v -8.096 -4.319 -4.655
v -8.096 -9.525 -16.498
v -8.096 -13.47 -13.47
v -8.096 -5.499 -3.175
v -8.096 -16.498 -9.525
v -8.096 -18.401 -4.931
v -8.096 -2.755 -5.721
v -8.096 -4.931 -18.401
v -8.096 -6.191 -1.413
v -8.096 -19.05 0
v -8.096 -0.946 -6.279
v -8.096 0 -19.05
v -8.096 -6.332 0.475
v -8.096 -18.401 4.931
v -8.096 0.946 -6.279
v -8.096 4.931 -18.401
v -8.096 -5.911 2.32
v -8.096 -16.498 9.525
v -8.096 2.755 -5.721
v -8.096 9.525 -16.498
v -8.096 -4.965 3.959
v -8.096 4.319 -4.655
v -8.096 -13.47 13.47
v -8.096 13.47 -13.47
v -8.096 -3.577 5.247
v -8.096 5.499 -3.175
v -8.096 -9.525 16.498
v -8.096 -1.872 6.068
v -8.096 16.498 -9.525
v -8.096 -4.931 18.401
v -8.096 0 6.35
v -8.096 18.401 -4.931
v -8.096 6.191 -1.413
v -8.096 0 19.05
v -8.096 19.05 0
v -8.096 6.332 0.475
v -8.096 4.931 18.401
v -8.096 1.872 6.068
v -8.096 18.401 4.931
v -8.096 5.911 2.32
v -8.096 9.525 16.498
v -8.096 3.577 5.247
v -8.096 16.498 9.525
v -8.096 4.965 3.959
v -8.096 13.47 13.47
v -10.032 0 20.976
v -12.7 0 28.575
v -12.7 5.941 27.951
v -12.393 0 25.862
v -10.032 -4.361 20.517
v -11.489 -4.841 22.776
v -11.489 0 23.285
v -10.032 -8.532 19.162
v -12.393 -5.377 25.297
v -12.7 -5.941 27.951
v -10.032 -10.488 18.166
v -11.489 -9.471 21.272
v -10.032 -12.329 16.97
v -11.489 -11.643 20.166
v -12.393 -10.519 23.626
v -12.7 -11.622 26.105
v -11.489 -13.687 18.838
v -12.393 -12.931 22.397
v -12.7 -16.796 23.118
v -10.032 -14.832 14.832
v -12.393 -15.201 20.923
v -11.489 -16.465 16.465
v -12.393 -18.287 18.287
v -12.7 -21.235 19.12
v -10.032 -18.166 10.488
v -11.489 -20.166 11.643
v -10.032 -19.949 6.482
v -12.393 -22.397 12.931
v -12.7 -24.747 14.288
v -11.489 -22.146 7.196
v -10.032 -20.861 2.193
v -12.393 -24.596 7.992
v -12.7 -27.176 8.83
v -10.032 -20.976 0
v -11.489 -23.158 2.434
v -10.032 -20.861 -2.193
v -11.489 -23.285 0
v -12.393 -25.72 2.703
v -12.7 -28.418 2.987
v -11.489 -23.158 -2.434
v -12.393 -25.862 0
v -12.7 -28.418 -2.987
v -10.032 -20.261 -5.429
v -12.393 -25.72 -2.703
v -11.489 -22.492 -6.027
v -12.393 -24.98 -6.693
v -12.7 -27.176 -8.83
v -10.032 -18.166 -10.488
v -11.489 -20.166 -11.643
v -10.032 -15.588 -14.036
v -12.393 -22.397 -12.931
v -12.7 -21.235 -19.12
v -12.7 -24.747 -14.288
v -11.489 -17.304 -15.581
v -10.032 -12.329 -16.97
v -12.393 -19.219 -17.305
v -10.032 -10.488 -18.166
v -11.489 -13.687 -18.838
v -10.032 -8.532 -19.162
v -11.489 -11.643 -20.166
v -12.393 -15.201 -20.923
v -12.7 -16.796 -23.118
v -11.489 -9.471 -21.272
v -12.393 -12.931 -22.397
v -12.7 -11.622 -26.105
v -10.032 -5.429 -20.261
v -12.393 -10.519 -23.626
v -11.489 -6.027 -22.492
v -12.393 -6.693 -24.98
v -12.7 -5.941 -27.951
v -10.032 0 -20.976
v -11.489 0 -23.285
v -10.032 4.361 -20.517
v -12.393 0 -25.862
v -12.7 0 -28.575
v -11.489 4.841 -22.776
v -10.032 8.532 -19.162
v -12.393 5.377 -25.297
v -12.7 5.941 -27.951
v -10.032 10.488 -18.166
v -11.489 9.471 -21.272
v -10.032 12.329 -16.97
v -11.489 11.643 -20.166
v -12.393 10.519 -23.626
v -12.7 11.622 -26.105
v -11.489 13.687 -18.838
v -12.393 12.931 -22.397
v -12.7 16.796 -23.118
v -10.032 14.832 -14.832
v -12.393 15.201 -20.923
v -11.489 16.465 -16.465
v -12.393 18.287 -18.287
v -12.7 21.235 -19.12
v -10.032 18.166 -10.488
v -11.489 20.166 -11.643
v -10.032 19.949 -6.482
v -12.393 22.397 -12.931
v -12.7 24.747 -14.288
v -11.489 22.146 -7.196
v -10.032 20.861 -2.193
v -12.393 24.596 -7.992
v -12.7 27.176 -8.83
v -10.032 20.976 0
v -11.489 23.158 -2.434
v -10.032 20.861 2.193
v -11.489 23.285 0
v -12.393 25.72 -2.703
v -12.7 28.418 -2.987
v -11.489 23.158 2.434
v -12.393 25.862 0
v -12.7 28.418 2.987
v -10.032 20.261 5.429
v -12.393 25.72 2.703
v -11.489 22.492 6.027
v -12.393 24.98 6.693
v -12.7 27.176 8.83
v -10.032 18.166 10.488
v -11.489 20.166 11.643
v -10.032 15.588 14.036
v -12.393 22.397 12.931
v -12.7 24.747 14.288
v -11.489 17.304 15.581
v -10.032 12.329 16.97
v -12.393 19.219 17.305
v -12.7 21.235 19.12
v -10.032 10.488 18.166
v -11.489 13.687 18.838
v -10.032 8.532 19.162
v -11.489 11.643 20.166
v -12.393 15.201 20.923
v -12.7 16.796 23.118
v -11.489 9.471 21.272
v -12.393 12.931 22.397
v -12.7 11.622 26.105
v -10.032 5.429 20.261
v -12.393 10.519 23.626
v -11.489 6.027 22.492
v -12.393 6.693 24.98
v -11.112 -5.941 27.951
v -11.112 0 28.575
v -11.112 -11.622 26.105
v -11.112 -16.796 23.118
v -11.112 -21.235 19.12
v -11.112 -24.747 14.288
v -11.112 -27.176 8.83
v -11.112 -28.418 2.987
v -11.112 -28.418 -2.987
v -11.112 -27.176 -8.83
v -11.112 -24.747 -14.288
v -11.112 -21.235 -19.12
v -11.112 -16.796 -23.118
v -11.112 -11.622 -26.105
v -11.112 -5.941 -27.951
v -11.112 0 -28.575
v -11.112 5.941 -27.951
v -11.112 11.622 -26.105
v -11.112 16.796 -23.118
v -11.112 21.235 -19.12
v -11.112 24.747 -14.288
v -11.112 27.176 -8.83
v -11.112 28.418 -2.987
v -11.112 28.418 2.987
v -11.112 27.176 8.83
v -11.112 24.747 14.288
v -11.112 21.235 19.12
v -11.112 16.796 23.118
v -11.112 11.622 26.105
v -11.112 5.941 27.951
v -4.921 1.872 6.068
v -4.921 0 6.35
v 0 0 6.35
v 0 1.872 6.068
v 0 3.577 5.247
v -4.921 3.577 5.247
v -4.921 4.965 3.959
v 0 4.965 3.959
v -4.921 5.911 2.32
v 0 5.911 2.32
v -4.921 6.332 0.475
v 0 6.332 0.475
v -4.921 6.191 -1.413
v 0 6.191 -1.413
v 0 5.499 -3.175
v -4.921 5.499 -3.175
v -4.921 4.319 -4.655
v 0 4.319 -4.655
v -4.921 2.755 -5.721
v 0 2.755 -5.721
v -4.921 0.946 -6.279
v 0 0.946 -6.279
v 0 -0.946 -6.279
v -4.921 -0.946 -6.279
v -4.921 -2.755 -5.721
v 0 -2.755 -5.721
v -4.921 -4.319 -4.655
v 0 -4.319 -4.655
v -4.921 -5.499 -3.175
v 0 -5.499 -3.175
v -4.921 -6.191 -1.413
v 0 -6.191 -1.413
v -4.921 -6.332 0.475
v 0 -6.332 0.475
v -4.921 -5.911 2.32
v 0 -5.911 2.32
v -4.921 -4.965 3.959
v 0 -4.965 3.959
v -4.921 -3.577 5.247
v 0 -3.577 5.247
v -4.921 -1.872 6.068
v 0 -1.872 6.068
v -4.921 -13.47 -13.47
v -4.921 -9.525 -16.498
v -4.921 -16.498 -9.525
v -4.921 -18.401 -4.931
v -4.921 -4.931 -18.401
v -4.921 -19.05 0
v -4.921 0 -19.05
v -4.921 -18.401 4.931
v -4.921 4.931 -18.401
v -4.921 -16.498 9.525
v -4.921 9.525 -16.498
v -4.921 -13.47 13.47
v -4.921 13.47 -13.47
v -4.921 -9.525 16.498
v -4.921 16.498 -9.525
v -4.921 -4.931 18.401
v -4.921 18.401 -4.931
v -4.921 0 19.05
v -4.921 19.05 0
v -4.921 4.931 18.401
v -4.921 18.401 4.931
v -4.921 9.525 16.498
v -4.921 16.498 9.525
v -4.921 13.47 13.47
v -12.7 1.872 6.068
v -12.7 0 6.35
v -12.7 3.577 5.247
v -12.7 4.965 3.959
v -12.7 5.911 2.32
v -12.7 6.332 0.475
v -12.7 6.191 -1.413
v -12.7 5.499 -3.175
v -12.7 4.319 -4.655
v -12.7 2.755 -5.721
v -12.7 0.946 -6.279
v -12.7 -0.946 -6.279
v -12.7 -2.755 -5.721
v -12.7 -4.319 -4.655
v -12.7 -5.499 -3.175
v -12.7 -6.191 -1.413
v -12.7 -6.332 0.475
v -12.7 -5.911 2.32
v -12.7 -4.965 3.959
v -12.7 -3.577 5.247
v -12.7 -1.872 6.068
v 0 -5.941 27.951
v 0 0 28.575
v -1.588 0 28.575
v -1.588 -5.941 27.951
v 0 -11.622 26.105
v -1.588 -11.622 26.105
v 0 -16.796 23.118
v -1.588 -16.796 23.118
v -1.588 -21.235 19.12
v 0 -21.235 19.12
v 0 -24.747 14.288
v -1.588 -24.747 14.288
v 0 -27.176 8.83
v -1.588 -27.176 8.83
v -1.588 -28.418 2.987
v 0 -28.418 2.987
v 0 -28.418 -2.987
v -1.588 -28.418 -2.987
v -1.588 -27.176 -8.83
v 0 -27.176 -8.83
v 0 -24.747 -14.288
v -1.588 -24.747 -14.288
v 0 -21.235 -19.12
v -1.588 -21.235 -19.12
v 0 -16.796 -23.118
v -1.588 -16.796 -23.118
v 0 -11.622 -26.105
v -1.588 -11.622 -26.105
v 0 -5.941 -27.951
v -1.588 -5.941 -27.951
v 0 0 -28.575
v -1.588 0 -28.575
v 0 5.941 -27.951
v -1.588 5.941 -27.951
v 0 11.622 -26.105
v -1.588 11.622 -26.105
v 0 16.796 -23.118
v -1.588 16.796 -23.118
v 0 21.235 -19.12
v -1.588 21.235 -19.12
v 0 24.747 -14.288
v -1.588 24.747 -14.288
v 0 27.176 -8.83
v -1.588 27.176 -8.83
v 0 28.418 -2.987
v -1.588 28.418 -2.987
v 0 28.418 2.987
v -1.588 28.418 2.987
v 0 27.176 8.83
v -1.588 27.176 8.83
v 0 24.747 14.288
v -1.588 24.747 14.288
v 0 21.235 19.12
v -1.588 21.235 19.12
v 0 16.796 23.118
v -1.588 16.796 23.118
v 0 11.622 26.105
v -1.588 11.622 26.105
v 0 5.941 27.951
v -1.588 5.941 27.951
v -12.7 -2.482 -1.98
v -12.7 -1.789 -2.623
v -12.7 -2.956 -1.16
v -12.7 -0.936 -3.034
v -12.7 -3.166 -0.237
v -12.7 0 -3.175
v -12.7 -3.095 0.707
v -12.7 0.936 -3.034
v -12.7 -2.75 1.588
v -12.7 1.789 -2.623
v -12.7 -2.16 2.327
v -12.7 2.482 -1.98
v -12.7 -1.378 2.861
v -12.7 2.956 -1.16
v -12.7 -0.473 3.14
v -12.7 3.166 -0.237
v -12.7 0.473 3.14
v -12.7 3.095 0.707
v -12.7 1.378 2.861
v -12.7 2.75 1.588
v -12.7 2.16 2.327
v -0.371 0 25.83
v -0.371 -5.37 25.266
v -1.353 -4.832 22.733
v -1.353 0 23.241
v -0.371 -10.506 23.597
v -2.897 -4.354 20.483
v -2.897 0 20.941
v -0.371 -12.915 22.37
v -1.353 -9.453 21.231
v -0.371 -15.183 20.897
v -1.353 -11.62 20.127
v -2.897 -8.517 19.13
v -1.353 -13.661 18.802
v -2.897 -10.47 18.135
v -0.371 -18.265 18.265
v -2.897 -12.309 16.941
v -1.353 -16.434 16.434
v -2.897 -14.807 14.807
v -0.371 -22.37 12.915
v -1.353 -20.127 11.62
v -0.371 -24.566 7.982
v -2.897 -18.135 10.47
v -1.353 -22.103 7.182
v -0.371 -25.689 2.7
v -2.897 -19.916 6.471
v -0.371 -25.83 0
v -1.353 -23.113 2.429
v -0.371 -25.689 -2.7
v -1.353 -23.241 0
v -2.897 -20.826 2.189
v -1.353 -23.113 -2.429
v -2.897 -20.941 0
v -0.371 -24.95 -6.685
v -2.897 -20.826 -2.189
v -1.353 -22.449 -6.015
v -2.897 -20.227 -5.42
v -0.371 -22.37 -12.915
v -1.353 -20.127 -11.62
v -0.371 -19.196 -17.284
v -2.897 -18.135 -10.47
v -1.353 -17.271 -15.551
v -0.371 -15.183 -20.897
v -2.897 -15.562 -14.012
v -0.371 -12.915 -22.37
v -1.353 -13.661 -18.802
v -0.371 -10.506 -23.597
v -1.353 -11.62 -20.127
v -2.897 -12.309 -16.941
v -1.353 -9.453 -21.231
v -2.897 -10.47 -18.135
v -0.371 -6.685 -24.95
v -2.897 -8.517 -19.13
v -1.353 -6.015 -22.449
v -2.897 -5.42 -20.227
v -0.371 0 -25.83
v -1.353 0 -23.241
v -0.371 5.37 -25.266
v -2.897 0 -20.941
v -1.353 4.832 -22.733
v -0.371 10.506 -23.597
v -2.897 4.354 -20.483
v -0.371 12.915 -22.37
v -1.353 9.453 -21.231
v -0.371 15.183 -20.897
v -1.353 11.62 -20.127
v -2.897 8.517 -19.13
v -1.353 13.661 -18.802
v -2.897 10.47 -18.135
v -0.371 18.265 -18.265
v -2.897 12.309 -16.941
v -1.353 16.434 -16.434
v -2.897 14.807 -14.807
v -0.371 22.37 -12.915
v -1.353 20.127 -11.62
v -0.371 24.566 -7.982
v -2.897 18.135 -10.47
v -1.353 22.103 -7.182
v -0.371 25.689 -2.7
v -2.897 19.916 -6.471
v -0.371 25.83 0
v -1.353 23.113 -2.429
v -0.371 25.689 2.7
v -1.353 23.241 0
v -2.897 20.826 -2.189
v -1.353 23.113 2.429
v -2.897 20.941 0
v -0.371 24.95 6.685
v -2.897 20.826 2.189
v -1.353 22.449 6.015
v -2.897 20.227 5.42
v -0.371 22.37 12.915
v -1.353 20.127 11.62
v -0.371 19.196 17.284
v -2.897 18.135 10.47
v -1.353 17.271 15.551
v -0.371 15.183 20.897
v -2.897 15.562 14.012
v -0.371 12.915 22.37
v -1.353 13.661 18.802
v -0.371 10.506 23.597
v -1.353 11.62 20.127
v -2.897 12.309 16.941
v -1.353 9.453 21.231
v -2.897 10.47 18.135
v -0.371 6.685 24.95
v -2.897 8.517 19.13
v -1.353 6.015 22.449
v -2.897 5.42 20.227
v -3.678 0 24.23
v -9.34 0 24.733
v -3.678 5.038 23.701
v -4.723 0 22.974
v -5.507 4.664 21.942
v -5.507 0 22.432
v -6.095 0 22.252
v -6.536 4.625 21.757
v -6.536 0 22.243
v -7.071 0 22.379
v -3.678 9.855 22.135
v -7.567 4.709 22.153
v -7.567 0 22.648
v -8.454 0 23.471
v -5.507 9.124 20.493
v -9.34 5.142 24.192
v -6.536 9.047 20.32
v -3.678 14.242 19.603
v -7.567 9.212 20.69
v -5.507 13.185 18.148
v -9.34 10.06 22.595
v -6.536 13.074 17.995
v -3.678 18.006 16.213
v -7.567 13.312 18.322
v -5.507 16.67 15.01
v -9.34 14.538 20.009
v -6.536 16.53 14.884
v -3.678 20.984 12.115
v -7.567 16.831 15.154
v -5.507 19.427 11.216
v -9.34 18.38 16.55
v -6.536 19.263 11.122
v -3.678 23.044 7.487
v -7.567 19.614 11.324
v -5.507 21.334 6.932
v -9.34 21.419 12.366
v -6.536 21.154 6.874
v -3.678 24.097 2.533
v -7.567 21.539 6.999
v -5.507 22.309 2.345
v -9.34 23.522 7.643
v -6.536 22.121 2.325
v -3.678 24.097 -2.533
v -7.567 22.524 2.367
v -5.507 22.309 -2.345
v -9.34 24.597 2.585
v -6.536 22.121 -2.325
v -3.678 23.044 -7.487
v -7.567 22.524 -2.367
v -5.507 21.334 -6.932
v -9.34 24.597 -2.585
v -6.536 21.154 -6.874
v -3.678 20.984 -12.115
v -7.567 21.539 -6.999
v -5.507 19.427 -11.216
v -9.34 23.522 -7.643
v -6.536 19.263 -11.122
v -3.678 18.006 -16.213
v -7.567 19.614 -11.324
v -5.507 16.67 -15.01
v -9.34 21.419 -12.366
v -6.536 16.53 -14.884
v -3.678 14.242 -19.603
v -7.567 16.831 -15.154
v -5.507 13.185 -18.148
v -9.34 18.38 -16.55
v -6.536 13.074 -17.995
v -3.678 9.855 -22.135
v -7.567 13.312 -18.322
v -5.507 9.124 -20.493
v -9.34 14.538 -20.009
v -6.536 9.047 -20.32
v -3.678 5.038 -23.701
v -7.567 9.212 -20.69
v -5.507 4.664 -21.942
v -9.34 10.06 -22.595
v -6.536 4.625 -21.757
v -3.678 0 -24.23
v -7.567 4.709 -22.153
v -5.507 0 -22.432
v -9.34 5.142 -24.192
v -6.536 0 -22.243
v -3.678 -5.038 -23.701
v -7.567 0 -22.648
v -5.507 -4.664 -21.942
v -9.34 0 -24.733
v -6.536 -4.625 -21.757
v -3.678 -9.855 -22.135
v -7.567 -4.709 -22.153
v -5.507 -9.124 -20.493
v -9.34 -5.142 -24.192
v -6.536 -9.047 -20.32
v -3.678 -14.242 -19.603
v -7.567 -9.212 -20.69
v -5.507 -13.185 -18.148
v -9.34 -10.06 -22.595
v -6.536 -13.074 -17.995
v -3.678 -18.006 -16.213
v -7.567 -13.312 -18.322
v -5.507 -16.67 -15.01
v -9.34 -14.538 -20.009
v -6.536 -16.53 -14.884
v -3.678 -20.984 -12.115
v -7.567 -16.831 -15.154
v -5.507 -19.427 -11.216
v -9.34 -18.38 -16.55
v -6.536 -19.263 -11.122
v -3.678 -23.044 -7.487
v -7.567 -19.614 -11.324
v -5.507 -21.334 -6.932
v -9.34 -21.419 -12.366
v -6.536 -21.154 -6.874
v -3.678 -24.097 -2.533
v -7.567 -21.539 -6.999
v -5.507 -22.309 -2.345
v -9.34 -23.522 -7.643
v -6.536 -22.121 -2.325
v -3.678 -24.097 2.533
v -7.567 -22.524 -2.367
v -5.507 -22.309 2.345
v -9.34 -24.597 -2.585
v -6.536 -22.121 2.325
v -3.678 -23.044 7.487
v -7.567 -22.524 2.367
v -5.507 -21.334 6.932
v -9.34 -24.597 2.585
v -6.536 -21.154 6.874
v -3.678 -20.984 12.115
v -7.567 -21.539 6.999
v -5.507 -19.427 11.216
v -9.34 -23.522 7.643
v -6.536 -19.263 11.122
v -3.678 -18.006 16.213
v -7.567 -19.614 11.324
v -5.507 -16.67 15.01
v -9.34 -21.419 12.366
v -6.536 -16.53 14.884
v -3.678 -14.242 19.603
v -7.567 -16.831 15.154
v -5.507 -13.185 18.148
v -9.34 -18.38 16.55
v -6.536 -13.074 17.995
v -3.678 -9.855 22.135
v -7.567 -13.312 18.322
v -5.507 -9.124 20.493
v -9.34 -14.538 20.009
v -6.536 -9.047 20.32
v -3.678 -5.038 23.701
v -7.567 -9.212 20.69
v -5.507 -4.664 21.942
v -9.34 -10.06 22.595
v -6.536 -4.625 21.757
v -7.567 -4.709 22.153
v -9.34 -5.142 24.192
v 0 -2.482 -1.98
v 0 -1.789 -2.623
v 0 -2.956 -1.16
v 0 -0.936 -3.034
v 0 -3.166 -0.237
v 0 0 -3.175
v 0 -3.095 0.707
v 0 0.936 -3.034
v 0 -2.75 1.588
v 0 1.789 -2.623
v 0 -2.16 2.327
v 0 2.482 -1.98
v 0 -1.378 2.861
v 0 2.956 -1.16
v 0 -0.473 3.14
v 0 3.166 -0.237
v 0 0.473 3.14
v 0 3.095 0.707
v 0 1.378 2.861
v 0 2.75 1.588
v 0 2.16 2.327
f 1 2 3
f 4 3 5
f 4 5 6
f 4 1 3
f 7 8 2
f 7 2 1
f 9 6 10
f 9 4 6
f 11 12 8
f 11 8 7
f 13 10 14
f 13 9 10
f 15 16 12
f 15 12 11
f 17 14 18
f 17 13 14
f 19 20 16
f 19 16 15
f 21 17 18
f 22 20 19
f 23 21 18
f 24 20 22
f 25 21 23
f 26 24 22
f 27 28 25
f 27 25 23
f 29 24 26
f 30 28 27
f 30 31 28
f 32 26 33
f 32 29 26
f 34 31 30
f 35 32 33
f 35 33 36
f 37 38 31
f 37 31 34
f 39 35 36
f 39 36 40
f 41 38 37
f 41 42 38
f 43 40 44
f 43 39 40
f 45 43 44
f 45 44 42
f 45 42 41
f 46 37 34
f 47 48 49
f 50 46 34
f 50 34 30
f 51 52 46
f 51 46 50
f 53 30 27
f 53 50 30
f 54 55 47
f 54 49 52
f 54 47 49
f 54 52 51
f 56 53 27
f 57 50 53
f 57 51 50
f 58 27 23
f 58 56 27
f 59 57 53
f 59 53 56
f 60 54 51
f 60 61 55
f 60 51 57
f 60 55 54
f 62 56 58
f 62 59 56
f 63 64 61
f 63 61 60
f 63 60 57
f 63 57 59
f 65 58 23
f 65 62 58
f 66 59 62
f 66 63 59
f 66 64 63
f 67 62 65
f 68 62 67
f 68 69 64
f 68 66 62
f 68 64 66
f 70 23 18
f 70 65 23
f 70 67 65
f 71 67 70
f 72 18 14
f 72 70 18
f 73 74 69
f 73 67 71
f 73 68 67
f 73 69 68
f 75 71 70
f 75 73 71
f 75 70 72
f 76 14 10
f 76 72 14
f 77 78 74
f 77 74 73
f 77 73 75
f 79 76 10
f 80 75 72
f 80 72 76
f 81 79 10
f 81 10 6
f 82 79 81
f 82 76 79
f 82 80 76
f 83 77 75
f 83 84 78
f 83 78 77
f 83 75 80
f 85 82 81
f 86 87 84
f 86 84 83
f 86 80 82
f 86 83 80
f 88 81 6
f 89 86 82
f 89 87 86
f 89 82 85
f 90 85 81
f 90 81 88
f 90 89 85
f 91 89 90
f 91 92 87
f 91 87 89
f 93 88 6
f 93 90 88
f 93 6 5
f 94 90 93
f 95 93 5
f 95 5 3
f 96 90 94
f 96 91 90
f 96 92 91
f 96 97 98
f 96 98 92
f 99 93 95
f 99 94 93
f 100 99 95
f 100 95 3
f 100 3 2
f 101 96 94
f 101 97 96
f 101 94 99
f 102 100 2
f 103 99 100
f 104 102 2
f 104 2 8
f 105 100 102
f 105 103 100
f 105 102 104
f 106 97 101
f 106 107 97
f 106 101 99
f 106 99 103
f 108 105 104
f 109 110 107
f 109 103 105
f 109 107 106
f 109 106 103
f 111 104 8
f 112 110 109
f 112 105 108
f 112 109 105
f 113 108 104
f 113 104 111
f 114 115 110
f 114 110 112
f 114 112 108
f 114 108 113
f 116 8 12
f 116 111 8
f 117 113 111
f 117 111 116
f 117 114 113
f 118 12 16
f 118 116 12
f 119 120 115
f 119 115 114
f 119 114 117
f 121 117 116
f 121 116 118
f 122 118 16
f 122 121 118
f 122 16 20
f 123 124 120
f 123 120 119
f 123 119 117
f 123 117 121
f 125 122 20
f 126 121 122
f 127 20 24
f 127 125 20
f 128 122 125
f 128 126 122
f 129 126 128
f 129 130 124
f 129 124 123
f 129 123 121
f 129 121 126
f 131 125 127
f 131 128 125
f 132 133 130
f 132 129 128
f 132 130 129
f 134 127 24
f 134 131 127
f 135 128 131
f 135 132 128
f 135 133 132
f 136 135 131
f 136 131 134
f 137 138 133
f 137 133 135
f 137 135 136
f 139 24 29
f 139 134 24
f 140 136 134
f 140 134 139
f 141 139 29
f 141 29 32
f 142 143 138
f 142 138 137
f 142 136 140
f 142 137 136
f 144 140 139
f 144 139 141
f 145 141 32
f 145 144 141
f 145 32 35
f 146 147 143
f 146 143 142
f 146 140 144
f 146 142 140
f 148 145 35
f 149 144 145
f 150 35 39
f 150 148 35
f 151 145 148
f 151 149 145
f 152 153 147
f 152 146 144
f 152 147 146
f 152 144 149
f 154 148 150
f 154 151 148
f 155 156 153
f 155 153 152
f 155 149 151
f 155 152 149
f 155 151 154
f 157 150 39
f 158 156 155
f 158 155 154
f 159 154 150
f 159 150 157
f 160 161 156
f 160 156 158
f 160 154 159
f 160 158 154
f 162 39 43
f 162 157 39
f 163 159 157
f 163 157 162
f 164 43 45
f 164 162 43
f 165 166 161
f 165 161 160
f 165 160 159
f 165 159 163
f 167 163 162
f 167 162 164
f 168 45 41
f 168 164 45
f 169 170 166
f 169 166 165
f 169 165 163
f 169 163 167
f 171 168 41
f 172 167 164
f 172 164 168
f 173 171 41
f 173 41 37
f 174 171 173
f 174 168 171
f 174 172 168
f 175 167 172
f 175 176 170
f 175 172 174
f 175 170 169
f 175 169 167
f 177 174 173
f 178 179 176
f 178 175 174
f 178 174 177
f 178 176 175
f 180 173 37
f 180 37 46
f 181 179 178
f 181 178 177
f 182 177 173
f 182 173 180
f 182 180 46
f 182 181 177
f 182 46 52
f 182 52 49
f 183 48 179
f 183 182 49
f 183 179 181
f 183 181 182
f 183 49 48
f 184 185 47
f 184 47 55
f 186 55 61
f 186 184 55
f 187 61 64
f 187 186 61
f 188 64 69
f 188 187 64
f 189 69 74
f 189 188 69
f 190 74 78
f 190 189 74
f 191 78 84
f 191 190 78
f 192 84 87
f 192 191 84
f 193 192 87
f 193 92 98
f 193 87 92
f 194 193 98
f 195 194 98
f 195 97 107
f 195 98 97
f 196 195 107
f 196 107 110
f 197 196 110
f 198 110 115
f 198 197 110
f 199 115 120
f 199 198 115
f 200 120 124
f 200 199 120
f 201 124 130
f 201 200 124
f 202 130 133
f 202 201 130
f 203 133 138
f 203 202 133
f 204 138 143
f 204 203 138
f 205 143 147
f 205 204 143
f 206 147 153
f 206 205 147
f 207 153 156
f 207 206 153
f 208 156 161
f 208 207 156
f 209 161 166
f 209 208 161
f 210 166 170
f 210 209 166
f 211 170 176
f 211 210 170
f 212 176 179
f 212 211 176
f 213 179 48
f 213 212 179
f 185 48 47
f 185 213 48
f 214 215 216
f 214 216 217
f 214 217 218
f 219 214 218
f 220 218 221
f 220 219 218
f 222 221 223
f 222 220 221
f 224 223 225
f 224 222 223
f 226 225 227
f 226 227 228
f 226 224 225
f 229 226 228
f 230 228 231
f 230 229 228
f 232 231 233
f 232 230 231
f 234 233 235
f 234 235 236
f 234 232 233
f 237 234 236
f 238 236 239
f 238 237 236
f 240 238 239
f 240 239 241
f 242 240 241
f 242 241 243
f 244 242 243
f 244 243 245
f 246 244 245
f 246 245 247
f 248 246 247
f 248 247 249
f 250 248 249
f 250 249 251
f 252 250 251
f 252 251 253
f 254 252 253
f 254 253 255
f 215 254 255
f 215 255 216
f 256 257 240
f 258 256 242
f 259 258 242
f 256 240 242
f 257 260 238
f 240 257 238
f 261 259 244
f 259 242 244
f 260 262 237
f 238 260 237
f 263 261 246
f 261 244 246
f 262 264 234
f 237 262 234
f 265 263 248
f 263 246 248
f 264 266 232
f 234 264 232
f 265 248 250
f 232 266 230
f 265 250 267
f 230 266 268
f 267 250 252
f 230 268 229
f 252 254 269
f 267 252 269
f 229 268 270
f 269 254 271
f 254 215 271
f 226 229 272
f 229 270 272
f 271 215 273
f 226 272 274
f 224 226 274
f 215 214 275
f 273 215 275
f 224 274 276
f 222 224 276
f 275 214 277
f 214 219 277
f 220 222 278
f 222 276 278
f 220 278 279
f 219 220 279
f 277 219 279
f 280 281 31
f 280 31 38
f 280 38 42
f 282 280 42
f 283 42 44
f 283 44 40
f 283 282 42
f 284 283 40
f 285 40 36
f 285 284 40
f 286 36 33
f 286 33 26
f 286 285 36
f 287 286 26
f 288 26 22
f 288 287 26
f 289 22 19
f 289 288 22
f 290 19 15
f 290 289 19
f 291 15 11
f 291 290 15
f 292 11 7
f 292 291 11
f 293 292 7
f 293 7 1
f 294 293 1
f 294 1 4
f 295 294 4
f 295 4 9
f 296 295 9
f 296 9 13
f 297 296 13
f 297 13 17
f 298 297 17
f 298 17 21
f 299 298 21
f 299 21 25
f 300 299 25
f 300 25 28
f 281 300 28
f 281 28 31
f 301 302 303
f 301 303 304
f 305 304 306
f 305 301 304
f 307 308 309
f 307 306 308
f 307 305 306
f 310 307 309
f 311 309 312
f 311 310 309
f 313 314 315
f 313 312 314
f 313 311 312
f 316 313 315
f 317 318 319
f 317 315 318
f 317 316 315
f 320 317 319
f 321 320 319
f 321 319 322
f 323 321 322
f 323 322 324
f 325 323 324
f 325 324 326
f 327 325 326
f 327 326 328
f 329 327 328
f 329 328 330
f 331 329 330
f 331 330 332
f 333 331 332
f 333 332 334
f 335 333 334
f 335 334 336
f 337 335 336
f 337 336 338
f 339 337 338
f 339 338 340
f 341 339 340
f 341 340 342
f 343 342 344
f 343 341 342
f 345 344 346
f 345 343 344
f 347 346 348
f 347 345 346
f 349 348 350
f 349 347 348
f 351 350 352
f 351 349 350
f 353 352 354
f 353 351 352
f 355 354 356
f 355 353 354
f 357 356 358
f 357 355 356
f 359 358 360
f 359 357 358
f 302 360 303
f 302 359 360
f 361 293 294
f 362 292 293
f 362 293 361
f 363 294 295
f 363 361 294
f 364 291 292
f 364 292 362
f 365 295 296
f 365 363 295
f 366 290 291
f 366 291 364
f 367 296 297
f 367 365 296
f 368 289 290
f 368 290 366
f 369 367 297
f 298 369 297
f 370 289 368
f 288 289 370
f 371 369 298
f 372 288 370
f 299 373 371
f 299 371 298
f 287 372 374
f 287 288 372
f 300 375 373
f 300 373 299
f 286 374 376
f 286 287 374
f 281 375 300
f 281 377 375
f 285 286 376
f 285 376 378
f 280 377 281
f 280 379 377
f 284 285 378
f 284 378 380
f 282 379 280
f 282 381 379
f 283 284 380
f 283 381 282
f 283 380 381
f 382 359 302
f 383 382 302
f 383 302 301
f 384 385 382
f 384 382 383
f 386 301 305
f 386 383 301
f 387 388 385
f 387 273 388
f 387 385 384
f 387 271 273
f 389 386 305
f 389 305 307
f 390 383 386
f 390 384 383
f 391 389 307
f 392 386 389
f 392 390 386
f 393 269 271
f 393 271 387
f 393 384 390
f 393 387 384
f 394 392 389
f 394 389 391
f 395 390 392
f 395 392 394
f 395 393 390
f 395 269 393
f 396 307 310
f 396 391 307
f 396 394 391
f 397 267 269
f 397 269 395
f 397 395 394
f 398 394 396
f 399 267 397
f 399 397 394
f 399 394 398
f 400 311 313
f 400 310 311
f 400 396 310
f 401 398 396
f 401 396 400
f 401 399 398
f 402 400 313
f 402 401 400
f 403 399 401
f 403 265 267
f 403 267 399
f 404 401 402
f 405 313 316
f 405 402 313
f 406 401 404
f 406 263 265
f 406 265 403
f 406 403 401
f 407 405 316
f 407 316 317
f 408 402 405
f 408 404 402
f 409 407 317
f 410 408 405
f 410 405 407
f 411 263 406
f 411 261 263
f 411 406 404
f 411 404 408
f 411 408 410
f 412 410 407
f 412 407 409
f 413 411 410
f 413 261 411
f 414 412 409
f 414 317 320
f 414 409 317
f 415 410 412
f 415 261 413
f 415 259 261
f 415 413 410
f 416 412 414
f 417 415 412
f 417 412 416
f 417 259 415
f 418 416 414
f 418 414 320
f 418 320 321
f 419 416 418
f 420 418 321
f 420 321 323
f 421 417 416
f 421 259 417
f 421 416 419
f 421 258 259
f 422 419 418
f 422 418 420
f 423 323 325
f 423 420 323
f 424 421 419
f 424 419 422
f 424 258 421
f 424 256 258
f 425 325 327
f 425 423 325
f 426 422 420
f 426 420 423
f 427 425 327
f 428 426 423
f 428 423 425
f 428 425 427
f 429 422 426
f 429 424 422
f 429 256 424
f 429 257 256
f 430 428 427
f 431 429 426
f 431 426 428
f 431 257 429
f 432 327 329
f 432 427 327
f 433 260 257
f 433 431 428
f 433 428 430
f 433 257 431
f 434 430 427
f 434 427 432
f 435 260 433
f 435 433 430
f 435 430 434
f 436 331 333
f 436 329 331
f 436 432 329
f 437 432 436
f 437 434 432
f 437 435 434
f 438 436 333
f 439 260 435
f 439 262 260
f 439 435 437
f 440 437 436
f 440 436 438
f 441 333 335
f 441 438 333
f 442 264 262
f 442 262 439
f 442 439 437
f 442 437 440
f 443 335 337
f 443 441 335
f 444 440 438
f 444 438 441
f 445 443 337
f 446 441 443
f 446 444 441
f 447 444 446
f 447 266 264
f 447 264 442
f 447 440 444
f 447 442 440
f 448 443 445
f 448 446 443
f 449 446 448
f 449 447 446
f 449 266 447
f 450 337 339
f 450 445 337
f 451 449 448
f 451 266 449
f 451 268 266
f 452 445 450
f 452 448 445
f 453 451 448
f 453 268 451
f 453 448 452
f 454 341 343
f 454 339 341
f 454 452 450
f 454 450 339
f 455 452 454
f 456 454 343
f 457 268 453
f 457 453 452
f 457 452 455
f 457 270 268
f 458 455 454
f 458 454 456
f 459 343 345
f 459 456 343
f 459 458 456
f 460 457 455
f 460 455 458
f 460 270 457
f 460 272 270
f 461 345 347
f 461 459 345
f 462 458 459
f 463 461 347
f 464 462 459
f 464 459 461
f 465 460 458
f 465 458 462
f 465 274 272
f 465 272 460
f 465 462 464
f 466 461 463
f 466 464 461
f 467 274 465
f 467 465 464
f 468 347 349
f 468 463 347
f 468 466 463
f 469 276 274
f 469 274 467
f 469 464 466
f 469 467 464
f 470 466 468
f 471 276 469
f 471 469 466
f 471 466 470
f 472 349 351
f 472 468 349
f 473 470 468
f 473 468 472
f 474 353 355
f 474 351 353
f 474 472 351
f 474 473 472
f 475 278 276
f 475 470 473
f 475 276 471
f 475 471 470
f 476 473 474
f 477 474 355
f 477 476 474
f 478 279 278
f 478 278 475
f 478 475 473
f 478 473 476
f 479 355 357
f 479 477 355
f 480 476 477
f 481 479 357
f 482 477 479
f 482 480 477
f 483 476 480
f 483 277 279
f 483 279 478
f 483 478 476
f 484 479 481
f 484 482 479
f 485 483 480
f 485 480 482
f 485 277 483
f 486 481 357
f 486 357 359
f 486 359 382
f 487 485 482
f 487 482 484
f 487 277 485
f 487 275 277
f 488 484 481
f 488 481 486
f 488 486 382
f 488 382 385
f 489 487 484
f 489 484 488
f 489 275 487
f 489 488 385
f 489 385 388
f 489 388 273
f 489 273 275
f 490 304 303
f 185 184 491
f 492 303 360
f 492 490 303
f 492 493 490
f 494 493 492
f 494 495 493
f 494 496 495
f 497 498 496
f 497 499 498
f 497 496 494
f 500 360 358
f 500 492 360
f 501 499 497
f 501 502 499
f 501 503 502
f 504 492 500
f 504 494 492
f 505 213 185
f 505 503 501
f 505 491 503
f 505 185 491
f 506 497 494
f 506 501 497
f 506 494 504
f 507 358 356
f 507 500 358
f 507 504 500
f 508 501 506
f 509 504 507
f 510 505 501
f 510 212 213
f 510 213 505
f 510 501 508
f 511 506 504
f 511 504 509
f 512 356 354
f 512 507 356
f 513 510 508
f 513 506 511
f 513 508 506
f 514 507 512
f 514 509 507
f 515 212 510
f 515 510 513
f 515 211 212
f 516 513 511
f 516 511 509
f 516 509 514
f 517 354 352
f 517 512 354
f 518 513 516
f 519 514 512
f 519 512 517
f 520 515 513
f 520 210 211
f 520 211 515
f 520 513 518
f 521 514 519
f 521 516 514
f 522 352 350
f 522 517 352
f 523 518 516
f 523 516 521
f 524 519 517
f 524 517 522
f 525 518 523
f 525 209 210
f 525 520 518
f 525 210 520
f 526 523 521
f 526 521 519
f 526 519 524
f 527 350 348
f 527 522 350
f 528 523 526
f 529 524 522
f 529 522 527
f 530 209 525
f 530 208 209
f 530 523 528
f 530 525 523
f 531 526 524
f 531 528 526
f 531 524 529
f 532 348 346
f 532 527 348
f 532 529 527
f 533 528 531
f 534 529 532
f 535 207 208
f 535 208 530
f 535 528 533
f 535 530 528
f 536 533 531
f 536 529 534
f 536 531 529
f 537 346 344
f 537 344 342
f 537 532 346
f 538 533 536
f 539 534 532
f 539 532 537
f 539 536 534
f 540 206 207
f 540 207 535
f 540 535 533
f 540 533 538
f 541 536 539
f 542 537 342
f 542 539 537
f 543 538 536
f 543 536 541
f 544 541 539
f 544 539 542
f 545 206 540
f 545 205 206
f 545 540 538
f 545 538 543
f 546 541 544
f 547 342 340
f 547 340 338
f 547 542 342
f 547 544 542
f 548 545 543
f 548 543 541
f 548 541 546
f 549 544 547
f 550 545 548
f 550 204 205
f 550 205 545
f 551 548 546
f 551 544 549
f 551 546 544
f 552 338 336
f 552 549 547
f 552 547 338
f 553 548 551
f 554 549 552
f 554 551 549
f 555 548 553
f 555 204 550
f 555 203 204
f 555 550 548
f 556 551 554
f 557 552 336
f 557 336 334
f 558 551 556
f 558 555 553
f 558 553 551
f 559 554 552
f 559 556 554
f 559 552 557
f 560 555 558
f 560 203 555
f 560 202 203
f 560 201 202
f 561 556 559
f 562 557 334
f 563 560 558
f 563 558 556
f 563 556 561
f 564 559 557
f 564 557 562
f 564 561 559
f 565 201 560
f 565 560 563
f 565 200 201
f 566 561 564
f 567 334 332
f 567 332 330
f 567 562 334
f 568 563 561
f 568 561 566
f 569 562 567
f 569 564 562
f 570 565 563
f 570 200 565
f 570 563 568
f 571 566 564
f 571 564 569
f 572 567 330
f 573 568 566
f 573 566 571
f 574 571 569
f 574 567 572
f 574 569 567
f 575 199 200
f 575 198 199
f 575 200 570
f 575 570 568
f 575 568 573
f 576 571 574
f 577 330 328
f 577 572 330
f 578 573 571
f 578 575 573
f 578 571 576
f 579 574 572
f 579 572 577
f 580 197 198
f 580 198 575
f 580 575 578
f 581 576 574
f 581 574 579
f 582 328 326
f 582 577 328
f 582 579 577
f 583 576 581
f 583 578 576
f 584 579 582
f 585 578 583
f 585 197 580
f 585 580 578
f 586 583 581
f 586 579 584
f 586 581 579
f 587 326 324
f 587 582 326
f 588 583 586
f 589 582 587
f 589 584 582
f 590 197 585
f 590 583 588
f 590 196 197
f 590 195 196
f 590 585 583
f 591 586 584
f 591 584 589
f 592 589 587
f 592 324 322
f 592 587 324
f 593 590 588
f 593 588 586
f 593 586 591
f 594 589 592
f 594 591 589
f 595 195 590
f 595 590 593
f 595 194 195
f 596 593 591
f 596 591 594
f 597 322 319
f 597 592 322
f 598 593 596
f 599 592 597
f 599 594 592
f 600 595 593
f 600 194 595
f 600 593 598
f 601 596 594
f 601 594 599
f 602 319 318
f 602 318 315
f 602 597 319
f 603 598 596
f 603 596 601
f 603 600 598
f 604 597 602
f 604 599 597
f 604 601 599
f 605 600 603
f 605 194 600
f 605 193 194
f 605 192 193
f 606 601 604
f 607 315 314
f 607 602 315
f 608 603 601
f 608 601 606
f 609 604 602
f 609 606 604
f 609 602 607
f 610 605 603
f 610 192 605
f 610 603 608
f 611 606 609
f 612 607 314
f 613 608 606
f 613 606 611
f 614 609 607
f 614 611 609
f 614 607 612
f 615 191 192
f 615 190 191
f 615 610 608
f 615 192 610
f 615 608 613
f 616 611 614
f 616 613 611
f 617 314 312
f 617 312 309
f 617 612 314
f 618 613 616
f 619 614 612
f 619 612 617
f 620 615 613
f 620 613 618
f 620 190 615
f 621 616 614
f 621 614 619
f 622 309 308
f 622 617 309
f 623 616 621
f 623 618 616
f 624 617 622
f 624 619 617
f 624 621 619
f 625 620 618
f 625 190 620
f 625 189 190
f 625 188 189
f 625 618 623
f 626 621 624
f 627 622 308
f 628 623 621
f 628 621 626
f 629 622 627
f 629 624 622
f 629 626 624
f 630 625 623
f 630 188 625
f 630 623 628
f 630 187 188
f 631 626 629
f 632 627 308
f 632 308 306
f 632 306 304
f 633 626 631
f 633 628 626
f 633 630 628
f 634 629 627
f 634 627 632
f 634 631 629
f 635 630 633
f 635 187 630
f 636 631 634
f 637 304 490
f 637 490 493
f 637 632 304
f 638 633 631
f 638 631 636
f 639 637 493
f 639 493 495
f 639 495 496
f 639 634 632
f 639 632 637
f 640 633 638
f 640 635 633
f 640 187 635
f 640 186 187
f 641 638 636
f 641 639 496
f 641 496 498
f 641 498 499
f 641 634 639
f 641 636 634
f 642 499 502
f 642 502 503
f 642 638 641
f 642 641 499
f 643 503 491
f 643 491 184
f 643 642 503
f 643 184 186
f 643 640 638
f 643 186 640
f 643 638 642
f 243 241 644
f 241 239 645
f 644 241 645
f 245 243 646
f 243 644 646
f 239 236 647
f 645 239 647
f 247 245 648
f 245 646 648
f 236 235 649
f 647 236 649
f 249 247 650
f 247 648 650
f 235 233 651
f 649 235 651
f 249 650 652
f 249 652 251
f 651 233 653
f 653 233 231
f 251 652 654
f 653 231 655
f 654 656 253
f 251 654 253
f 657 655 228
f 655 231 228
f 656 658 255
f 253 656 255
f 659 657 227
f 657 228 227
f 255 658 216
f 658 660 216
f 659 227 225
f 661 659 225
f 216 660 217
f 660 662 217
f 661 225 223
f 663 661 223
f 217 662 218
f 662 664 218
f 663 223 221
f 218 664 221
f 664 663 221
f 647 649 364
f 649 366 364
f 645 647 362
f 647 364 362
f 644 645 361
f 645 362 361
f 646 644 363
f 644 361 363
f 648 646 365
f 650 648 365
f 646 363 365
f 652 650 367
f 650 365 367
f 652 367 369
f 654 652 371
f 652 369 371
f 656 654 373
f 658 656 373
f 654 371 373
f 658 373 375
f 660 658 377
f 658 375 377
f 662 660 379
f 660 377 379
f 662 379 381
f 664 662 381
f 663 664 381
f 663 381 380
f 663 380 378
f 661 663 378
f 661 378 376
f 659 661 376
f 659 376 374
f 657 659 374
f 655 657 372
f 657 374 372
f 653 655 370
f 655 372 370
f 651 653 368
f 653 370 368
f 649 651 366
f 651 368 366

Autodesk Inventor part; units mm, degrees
ref_plane "YZ Plane" through (0, 0, 0) normal (1, 0, 0) x (0, 1, 0)
ref_plane "XZ Plane" through (0, 0, 0) normal (0, 1, 0) x (-1, 0, 0)
ref_plane "XY Plane" through (0, 0, 0) normal (0, 0, 1) x (1, 0, 0)
sketch "Sketch1" plane through (0, 0, 0) normal (0, 1, 0) x (-1, 0, 0)
  line L0 (0, 0) -> (12.7, 0)
  line L1 (12.7, 0) -> (12.7, 6.35)
  line L2 (0, 6.35) -> (0, 0)
  spline S0 degree 2 poles (1.5875, 28.575) (6.35, 15.892) (11.1125, 28.575) knots 0 0 0 1 1 1
  line L3 (12.7, 6.35) -> (12.7, 0)
  line L4 (0, 6.35) -> (0, 0)
  line L5 (12.7, 28.575) -> (11.1125, 28.575)
  line L6 (1.5875, 28.575) -> (0, 28.575)
  arc A0 (8.0957, 19.05) -> (12.7, 28.575) centre (0.5456, 28.575) ccw
  arc A1 (0, 28.575) -> (4.9207, 19.05) centre (12.152, 28.8193) ccw
  line L7 (4.9207, 19.05) -> (4.9207, 6.35)
  line L8 (8.0957, 19.05) -> (8.0957, 6.35)
  line L9 (0, 6.35) -> (4.9207, 6.35)
  line L10 (8.0957, 6.35) -> (12.7, 6.35)
  point P0 (6.35, 22.2335)
  dimension "d0" = 12.7
  dimension "d1" = 28.575
  dimension "d7" = 1.5875
  dimension "d8" = 1.5875
  dimension "d12" = 3.175
  dimension "d14" = 6.35
  dimension "d15" = 6.35
revolve "Revolution1" add sketch "Sketch1" angle 360 about axis through (0, 0, 0) along (-1, 0, 0)
sketch "Sketch2" plane through (0, 0, 0) normal (1, 0, 0) x (0, 0, -1)
  circle A0 centre (0, 0) radius 6.35 projected
hole "Hole1" at (0, 0, 0) direction (-1, 0, 0) diameter 6.35 end through all
properties part number "pulley wheel" material "Polyethylene, Low Density"
